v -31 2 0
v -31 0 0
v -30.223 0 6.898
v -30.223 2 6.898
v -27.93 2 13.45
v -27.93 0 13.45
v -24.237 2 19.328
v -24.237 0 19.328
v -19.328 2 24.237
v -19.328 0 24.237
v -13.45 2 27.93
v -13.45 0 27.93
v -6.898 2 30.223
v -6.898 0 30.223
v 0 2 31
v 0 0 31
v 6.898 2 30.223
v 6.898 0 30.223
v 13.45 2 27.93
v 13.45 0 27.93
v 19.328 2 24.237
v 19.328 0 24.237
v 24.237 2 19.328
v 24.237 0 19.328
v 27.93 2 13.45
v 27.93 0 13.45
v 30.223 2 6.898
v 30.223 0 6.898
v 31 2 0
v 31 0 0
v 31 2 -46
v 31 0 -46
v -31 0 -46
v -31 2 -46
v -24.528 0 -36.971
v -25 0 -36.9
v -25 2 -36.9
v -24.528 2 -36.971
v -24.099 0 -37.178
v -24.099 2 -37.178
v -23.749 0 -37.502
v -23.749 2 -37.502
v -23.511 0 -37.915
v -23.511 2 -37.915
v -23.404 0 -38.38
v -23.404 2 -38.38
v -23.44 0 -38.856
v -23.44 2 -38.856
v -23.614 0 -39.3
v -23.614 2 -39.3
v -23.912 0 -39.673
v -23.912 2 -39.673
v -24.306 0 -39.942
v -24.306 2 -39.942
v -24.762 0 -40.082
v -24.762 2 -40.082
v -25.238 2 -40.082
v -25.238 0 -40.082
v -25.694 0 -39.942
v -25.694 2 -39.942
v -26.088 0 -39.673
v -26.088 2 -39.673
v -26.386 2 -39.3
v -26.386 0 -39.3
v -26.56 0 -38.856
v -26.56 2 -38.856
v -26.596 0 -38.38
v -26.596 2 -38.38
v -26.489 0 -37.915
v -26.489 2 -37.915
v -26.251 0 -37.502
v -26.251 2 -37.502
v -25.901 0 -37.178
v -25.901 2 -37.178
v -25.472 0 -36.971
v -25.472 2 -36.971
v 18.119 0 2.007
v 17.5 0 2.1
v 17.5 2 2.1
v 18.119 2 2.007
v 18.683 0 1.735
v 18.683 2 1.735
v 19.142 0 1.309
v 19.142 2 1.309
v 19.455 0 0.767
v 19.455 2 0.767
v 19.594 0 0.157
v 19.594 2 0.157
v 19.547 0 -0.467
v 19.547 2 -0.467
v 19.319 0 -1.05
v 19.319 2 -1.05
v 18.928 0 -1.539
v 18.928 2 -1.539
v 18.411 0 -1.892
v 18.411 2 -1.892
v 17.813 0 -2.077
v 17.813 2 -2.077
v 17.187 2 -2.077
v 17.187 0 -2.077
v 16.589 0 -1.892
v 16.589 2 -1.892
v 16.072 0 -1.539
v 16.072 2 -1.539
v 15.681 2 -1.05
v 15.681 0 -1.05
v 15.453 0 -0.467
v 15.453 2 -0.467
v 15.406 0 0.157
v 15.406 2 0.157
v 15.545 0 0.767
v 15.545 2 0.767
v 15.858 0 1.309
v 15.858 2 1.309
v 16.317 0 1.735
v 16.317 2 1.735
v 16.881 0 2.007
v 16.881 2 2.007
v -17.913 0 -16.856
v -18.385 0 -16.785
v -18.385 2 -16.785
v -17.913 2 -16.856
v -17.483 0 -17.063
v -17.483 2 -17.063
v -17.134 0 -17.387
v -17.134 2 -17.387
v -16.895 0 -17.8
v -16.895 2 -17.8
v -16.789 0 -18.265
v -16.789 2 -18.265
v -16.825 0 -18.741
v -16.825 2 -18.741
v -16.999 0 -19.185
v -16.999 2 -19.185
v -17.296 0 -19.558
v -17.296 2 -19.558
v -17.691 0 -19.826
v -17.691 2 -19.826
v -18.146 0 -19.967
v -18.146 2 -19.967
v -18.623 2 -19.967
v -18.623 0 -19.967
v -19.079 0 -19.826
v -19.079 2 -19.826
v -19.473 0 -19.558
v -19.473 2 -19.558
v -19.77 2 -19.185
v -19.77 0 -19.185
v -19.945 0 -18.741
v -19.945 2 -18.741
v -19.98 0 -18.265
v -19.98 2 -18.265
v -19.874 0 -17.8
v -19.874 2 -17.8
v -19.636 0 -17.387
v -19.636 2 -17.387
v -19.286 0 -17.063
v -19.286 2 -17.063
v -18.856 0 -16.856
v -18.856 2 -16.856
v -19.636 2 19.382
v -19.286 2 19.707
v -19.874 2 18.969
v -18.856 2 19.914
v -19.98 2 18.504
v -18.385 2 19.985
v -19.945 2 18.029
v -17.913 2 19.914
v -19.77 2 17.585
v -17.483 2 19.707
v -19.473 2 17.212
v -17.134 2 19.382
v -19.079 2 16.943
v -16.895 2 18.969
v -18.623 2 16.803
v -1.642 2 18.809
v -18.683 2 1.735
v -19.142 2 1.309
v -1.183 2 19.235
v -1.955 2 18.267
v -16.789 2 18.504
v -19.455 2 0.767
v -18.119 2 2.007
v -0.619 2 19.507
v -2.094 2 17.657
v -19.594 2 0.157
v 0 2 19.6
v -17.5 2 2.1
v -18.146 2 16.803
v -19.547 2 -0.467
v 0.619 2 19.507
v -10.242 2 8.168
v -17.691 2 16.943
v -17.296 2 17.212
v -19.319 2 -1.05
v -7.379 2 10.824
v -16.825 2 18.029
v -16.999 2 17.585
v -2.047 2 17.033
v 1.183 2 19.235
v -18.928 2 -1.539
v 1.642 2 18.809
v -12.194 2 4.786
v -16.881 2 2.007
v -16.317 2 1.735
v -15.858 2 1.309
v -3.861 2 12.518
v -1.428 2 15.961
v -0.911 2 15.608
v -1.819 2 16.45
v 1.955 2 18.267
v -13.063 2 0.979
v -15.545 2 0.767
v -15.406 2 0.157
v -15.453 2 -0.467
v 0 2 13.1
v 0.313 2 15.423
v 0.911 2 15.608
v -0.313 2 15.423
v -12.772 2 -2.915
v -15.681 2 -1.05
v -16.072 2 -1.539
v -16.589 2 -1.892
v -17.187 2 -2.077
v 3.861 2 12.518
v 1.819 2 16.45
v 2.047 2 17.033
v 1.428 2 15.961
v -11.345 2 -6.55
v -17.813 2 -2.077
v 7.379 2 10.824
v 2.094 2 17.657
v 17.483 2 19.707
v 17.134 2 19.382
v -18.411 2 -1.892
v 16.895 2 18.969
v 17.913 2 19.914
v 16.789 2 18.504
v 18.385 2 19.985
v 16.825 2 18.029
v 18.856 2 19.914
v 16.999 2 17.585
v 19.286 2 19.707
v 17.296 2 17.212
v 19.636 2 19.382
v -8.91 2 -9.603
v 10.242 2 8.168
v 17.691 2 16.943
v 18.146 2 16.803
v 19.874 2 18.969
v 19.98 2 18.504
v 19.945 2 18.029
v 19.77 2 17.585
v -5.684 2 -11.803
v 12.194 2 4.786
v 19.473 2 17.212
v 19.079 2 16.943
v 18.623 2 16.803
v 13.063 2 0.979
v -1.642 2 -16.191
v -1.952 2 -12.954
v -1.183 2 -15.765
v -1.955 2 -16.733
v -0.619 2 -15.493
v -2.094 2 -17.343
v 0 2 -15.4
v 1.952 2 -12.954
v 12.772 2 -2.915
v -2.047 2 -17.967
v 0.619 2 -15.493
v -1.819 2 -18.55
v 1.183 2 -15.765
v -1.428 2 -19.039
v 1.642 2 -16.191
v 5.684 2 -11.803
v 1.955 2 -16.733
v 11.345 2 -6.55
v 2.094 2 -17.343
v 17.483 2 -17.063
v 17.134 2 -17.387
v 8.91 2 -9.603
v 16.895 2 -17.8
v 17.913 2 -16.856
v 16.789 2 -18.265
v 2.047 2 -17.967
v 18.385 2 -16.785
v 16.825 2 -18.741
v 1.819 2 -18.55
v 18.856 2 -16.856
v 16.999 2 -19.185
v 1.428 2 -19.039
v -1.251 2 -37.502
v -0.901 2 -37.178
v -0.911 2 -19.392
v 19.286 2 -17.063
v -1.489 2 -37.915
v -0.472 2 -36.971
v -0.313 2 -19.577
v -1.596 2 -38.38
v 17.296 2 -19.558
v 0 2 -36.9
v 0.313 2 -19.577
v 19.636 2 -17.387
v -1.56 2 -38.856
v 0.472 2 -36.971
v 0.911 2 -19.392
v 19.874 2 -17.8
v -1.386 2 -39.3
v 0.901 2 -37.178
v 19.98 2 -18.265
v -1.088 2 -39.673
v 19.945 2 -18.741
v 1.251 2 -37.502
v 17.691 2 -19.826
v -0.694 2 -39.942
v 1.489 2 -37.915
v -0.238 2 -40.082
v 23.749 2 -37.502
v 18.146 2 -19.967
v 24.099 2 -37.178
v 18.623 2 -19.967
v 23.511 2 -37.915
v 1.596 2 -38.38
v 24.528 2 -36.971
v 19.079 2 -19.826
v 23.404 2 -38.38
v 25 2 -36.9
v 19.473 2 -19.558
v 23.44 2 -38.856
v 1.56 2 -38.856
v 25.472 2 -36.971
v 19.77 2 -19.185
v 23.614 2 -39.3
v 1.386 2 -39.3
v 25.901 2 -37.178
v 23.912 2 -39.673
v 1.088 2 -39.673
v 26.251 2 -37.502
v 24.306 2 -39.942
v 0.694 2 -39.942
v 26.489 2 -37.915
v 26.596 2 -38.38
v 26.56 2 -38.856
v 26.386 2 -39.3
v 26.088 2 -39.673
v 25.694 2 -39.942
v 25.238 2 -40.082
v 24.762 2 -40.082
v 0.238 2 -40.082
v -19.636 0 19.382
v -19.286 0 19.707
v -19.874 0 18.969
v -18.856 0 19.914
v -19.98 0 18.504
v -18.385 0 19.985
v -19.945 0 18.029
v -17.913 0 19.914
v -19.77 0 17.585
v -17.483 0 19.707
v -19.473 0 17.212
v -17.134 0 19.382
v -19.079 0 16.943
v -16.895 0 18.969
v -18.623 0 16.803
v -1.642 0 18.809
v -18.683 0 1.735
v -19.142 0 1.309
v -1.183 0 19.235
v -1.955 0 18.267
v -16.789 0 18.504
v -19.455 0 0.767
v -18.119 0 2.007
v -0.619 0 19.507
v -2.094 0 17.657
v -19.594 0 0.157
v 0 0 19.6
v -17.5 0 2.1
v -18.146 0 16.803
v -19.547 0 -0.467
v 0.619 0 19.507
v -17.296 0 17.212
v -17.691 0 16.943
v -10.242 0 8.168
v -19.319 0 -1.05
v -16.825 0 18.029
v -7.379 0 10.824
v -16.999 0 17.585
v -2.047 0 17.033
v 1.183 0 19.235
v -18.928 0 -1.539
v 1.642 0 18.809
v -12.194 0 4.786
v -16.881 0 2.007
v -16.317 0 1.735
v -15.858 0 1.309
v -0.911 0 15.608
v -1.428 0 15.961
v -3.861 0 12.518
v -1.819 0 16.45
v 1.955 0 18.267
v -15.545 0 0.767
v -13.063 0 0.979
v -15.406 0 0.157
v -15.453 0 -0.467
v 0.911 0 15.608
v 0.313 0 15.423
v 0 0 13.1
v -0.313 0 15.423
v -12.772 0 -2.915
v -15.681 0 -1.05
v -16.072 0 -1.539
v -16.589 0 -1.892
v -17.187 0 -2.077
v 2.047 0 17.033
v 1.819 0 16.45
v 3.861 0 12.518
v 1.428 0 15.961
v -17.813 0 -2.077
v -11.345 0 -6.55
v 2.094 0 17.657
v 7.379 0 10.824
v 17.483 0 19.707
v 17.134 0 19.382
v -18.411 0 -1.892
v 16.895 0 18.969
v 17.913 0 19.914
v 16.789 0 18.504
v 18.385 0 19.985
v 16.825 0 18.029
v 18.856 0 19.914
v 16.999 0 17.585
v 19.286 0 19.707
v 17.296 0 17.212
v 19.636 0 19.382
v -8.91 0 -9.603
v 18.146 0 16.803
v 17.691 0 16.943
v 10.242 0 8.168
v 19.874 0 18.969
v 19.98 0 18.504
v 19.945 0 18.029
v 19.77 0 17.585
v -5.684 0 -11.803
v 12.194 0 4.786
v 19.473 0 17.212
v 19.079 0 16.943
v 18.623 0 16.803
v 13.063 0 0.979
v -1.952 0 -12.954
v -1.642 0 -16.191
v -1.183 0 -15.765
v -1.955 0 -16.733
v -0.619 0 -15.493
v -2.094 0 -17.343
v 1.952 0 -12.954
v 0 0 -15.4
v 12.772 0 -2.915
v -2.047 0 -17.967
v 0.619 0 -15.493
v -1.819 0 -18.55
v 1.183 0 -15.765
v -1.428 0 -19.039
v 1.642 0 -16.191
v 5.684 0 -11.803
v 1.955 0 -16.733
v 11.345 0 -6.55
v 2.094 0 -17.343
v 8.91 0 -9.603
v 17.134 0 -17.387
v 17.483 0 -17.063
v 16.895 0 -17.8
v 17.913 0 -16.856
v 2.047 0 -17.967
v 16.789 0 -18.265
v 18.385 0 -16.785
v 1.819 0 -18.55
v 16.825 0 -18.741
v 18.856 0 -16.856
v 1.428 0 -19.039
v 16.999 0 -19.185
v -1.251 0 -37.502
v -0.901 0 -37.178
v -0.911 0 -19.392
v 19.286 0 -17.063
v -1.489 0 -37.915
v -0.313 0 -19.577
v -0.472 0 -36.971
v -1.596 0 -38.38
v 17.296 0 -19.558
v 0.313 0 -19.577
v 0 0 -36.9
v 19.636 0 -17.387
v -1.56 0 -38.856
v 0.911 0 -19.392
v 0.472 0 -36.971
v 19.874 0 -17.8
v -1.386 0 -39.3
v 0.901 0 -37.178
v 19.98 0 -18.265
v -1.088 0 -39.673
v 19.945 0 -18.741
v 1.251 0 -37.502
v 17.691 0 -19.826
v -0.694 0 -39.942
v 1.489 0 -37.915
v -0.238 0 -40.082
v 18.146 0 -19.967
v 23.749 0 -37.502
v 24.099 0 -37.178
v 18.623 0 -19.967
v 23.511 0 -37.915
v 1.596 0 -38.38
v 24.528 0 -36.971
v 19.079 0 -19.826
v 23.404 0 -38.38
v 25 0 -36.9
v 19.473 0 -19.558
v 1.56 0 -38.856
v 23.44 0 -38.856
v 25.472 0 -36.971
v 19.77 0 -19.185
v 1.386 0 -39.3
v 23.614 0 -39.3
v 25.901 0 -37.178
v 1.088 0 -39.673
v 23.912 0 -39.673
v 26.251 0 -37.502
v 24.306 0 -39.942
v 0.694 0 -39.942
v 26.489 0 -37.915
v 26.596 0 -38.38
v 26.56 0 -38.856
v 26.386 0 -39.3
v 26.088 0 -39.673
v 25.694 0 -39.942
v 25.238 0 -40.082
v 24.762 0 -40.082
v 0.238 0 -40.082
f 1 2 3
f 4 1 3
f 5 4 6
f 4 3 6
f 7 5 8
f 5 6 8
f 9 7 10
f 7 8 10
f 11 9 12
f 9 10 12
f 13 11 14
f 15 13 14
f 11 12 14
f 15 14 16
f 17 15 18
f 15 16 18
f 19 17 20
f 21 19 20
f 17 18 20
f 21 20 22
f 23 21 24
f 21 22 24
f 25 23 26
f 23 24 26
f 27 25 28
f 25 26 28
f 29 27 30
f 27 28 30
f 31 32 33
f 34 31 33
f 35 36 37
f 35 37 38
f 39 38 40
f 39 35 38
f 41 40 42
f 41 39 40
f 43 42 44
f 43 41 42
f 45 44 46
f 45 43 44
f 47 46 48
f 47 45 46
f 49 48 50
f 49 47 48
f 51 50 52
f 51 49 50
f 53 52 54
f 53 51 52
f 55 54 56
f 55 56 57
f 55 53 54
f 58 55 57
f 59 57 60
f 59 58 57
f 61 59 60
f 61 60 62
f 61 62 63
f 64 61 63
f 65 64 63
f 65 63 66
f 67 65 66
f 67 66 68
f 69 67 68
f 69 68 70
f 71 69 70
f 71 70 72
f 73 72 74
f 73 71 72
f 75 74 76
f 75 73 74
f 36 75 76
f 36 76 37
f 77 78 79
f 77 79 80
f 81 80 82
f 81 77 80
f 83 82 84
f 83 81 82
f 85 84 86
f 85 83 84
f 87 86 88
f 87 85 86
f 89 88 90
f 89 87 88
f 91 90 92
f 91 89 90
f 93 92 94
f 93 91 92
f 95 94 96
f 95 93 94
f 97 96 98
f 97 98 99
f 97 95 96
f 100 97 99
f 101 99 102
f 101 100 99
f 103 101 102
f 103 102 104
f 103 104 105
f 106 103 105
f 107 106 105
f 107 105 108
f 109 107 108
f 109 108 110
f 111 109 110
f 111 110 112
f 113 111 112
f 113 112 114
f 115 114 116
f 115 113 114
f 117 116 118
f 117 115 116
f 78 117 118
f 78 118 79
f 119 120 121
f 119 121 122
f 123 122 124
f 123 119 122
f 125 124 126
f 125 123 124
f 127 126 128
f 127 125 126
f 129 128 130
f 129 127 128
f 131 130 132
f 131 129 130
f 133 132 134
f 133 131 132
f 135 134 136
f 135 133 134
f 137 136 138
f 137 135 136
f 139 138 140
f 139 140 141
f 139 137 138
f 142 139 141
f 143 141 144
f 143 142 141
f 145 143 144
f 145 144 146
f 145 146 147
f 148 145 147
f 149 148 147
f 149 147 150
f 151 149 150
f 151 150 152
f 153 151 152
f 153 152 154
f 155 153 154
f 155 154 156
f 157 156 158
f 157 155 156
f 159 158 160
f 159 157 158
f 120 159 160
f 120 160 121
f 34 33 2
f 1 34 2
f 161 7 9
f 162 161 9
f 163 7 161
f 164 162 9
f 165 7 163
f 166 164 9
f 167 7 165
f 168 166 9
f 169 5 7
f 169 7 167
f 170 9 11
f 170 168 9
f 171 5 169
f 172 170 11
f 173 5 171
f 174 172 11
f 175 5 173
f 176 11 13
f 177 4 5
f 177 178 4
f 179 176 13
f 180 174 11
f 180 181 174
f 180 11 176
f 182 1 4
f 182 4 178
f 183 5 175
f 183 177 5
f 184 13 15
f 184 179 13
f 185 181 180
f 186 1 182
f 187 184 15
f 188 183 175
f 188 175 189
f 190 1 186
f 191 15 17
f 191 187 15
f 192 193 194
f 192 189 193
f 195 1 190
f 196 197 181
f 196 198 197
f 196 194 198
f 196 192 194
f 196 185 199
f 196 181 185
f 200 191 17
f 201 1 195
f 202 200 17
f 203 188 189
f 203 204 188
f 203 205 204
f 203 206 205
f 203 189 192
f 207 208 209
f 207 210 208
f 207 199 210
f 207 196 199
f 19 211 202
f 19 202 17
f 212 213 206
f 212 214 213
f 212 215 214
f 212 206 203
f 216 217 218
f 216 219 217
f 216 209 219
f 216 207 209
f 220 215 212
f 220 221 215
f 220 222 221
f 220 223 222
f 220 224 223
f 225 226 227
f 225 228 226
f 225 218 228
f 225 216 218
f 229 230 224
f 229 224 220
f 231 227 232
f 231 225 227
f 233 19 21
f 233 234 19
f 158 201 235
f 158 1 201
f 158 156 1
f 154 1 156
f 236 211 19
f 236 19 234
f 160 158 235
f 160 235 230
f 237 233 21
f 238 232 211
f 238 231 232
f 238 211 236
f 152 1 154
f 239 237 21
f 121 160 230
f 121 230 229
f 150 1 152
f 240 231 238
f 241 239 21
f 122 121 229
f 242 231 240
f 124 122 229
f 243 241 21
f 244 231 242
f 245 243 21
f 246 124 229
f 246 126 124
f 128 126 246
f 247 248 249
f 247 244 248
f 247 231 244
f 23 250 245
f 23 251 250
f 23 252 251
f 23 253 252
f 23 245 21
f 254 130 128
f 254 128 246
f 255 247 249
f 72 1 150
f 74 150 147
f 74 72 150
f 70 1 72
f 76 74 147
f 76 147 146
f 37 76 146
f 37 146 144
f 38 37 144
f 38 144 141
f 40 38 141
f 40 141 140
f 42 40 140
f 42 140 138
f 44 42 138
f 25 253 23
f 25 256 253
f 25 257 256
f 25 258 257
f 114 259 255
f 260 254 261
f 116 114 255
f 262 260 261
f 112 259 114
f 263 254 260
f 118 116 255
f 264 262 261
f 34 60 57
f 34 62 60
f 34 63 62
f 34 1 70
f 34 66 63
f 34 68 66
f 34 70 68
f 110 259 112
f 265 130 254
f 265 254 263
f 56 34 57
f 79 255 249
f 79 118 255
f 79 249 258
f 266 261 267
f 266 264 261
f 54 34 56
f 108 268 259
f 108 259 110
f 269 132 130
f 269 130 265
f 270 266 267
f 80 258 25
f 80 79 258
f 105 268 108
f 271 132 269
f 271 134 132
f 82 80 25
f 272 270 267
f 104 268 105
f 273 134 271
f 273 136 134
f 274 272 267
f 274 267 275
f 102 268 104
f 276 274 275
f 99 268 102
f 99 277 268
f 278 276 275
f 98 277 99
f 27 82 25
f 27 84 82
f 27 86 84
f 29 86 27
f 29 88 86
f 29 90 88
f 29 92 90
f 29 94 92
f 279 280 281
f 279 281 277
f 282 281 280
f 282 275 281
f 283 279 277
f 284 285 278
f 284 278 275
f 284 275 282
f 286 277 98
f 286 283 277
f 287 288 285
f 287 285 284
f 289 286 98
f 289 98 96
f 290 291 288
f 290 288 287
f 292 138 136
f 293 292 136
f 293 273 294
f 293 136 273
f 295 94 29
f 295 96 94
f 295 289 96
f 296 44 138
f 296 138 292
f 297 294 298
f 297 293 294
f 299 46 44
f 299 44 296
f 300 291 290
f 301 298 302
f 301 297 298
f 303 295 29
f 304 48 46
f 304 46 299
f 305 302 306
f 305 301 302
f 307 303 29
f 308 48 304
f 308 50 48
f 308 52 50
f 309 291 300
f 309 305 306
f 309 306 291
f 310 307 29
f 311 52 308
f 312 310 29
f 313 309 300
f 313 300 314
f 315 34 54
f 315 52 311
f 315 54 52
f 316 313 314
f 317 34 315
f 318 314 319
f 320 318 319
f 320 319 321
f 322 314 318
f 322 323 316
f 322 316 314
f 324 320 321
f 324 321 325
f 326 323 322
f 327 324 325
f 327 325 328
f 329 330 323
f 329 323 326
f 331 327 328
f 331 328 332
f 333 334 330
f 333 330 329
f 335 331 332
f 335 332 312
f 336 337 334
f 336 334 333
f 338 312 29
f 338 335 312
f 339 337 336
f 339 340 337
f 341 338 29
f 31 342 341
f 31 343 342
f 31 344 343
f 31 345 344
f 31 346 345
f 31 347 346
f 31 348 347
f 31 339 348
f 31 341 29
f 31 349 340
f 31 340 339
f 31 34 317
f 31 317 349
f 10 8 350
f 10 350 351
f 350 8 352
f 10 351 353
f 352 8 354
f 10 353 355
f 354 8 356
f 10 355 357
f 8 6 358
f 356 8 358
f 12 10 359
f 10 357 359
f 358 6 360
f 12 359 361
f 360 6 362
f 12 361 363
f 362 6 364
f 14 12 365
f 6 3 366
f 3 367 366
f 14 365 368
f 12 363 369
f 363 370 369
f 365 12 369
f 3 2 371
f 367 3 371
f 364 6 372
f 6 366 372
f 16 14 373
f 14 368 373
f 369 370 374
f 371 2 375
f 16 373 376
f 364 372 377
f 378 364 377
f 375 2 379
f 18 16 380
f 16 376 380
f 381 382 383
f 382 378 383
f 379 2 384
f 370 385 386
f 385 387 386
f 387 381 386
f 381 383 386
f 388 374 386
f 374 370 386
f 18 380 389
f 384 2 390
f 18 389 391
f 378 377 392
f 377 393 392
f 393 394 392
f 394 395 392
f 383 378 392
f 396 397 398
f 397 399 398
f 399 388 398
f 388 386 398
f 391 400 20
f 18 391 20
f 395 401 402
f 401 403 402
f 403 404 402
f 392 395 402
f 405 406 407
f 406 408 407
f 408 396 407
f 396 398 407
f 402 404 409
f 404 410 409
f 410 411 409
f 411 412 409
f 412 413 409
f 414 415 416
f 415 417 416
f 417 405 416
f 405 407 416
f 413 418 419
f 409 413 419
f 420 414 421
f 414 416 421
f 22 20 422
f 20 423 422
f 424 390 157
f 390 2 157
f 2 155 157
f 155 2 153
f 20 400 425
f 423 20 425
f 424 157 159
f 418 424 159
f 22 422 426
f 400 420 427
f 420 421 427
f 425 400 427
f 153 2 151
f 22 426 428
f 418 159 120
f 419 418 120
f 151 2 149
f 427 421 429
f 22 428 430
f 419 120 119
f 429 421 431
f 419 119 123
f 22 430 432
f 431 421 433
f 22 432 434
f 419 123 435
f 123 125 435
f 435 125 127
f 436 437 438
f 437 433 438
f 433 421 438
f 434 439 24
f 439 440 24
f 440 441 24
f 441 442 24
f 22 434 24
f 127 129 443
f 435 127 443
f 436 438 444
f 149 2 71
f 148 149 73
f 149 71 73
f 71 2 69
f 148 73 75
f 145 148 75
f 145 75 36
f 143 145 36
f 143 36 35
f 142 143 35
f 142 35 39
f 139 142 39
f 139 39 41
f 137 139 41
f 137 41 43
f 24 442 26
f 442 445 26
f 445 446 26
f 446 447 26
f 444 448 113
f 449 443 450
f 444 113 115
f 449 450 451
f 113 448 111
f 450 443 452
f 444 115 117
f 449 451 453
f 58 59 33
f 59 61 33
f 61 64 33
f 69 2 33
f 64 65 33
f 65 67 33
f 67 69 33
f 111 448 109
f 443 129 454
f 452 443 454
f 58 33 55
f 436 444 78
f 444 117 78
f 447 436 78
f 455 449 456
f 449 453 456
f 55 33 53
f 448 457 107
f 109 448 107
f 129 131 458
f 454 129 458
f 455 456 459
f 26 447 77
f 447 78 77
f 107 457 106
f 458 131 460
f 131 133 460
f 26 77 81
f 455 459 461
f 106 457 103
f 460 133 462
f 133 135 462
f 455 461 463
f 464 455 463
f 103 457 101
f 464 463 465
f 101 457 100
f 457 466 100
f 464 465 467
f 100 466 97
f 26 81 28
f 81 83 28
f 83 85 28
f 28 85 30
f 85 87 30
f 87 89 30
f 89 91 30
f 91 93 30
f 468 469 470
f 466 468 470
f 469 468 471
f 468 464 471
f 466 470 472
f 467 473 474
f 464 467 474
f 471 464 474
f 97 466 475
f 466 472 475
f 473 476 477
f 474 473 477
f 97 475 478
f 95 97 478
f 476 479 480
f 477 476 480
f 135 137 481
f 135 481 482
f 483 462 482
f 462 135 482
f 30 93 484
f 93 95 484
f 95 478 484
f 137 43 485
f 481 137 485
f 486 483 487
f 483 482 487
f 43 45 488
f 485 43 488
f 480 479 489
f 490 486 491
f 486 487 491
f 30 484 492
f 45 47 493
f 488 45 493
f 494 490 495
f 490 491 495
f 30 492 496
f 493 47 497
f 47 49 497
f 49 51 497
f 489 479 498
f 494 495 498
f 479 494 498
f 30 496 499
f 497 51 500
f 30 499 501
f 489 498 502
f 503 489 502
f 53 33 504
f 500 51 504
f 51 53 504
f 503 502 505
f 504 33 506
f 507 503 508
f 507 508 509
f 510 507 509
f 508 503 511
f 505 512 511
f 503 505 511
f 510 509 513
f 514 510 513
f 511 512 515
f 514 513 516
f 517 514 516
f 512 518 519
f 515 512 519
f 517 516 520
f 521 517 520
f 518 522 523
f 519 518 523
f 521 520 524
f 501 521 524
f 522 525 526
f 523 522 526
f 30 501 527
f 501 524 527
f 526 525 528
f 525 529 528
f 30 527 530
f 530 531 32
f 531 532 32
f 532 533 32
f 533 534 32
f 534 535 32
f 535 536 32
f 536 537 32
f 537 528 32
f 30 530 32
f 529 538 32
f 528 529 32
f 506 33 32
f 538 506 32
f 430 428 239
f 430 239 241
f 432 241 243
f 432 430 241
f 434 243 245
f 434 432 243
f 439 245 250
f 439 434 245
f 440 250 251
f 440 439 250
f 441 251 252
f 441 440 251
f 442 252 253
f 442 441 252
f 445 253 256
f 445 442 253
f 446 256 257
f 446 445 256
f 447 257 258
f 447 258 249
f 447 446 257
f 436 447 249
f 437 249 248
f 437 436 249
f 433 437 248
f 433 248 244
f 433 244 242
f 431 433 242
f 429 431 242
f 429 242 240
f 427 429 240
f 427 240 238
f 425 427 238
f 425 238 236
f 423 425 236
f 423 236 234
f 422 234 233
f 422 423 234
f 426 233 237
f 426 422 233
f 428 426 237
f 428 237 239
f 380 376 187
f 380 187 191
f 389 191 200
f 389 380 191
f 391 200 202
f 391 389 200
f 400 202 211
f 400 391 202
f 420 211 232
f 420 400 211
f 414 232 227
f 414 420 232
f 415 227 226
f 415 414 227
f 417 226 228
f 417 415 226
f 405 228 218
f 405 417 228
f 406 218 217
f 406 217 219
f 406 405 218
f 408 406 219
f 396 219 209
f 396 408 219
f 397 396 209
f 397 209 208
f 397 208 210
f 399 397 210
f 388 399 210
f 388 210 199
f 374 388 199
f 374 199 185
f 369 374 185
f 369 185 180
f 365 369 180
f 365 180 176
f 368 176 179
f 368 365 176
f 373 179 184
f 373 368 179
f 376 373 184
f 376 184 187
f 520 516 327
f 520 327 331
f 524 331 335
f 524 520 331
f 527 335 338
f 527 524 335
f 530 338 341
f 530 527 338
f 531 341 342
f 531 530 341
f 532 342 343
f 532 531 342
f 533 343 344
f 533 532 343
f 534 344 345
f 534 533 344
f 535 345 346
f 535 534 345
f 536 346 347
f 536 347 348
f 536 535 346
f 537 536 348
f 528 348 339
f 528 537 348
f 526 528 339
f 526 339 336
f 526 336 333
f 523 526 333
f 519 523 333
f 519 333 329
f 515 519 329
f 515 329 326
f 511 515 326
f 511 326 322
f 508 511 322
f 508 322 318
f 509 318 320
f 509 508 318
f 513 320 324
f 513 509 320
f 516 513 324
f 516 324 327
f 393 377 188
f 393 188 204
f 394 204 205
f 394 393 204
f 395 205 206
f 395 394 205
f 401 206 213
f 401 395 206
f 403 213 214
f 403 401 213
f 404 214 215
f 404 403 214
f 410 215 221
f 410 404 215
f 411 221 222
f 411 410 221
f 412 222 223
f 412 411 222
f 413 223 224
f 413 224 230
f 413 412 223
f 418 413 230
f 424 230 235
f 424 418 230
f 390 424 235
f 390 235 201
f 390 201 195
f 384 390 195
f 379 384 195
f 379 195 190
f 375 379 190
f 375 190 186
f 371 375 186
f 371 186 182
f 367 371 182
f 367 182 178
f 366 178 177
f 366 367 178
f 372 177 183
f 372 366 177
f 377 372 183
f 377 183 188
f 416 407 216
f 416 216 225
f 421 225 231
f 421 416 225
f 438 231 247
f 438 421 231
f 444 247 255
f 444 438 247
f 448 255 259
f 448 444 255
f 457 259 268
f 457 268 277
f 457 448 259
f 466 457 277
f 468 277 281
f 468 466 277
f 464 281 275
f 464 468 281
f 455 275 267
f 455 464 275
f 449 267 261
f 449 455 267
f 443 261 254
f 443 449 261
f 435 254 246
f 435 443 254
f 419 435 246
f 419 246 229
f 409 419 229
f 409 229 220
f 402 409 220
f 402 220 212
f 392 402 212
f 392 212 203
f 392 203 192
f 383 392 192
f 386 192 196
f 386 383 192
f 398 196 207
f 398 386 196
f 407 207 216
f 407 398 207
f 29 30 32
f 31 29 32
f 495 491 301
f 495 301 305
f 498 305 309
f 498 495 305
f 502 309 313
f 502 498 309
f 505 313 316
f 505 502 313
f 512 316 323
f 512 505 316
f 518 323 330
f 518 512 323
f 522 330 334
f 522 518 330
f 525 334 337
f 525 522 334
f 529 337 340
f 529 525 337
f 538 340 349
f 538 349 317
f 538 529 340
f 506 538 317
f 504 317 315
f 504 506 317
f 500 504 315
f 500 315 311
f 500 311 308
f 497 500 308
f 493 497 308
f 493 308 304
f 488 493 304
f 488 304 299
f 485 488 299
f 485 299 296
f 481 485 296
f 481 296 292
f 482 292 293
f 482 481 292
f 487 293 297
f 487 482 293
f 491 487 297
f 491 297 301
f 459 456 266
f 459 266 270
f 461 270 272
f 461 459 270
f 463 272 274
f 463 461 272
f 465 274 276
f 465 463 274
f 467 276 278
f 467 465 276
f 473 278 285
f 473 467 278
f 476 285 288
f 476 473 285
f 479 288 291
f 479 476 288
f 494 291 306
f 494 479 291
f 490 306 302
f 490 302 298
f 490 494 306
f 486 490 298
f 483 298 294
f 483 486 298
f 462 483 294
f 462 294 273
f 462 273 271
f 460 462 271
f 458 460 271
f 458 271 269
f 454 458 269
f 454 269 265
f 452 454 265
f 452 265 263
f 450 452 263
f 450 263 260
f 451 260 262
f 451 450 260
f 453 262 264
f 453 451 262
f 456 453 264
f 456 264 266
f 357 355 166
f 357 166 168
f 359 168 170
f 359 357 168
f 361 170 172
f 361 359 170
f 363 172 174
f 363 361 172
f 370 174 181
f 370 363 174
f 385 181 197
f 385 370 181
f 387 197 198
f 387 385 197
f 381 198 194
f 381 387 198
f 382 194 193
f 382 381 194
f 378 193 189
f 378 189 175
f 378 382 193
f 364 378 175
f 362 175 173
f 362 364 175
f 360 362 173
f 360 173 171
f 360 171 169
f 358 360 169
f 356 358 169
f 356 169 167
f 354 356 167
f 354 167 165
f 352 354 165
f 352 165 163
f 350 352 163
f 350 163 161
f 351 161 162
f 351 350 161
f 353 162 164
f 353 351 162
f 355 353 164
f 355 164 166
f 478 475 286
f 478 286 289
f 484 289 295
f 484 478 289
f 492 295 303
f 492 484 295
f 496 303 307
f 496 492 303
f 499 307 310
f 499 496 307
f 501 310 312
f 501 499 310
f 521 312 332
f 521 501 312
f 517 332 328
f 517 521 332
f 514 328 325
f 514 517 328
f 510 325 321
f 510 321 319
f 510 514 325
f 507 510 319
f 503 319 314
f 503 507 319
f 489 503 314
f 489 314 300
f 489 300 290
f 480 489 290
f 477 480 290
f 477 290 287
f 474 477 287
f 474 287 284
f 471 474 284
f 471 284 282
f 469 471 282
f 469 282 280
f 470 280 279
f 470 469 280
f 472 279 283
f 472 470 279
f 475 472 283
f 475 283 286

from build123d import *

# Parameters (mm, degrees)
SKETCH_1_R      = 1.6
SKETCH_1_R_2    = 31
SKETCH_1_R_3    = 21
SKETCH_1_R_4    = 2.1
SKETCH_1_R_5    = 13.1
EXTRUDE_1_DEPTH = 2


with BuildPart() as part:
    # 草图1 → 凸台-拉伸1 (new body)
    # profile 1 of 3: a face of its own
    with BuildSketch(Plane(origin=(0, 0, 0), x_dir=(1, 0, 0), z_dir=(0, 1, 0))):
        with BuildLine():
            Line((-31, 31), (-31, 0))
            ThreePointArc((-31, 0), (0, 31), (31, 0))
            Line((31, 0), (31, 31))
            Line((31, 31), (31, 46))
            Line((31, 46), (-31, 46))
            Line((-31, 46), (-31, 31))
        make_face()
        with Locations(Location((-25, 38.5, 0), (0, 0, 270))):
            Circle(SKETCH_1_R, mode=Mode.SUBTRACT)
        with Locations(Location((0, 38.5, 0), (0, 0, 270))):
            Circle(SKETCH_1_R, mode=Mode.SUBTRACT)
        with Locations(Location((25, 38.5, 0), (0, 0, 270))):
            Circle(SKETCH_1_R, mode=Mode.SUBTRACT)
    # profile 2 of 3: a face of its own
    with BuildSketch(Plane(origin=(0, 0, 0), x_dir=(1, 0, 0), z_dir=(0, 1, 0))):
        Circle(SKETCH_1_R_2)
        with Locations(Location((-18.384776311, 18.384776311, 0), (0, 0, 270))):
            Circle(SKETCH_1_R, mode=Mode.SUBTRACT)
        with Locations(Location((-18.384776311, -18.384776311, 0), (0, 0, 270))):
            Circle(SKETCH_1_R, mode=Mode.SUBTRACT)
        with Locations(Location((18.384776311, -18.384776311, 0), (0, 0, 270))):
            Circle(SKETCH_1_R, mode=Mode.SUBTRACT)
        with Locations(Location((18.384776311, 18.384776311, 0), (0, 0, 270))):
            Circle(SKETCH_1_R, mode=Mode.SUBTRACT)
        Circle(SKETCH_1_R_3, mode=Mode.SUBTRACT)
    # profile 3 of 3: a face of its own
    with BuildSketch(Plane(origin=(0, 0, 0), x_dir=(1, 0, 0), z_dir=(0, 1, 0))):
        Circle(SKETCH_1_R_3)
        with Locations(Location((17.5, 0, 0), (0, 0, 270))):
            Circle(SKETCH_1_R_4, mode=Mode.SUBTRACT)
        with Locations(Location((0, -17.5, 0), (0, 0, 270))):
            Circle(SKETCH_1_R_4, mode=Mode.SUBTRACT)
        with Locations(Location((-17.5, 0, 0), (0, 0, 270))):
            Circle(SKETCH_1_R_4, mode=Mode.SUBTRACT)
        with Locations(Location((0, 17.5, 0), (0, 0, 270))):
            Circle(SKETCH_1_R_4, mode=Mode.SUBTRACT)
        with Locations(Location((0, 0, 0), (0, 0, 270))):
            Circle(SKETCH_1_R_5, mode=Mode.SUBTRACT)
    extrude(amount=EXTRUDE_1_DEPTH)


solid = part.part
